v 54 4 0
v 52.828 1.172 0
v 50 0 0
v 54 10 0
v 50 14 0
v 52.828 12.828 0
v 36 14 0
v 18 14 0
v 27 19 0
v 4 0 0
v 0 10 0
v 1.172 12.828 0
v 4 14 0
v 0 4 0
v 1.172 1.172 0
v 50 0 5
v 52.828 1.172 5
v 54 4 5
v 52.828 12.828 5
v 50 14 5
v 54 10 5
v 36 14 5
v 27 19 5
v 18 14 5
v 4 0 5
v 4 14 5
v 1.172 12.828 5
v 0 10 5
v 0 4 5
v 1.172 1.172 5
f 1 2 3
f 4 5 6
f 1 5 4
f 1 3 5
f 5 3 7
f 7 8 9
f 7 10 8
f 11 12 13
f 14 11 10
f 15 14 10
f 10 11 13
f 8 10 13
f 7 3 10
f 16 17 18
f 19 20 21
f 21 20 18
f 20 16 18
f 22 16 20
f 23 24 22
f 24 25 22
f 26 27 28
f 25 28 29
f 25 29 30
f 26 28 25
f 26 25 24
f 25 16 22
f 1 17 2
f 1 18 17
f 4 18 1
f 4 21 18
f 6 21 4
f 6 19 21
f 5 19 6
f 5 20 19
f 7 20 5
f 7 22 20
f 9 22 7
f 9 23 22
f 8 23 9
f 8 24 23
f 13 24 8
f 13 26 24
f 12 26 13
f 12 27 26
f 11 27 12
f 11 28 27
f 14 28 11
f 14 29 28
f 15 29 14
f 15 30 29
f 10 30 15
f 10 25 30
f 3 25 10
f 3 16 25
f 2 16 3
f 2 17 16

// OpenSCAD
$fn = 32;

// ----------------------------------------------------------------------
// Ratchet pawl: 54 x 14 mm body, beak 5 mm сверху
// ----------------------------------------------------------------------

// --- parameters (mm) ---
profile_height = 5;       // extrusion height
profile_points = 15;      // points of the closed outline

profile = [[0, 4], [1.172, 1.172], [4, 0], [50, 0], [52.828, 1.172], [54, 4], [54, 10], [52.828, 12.828], [50, 14], [36, 14], [27, 19], [18, 14], [4, 14], [1.172, 12.828], [0, 10]];  // single closed polygon, 15 points, counter clockwise

// --- the one profile operation ---
linear_extrude(height = profile_height) polygon(points = profile);
